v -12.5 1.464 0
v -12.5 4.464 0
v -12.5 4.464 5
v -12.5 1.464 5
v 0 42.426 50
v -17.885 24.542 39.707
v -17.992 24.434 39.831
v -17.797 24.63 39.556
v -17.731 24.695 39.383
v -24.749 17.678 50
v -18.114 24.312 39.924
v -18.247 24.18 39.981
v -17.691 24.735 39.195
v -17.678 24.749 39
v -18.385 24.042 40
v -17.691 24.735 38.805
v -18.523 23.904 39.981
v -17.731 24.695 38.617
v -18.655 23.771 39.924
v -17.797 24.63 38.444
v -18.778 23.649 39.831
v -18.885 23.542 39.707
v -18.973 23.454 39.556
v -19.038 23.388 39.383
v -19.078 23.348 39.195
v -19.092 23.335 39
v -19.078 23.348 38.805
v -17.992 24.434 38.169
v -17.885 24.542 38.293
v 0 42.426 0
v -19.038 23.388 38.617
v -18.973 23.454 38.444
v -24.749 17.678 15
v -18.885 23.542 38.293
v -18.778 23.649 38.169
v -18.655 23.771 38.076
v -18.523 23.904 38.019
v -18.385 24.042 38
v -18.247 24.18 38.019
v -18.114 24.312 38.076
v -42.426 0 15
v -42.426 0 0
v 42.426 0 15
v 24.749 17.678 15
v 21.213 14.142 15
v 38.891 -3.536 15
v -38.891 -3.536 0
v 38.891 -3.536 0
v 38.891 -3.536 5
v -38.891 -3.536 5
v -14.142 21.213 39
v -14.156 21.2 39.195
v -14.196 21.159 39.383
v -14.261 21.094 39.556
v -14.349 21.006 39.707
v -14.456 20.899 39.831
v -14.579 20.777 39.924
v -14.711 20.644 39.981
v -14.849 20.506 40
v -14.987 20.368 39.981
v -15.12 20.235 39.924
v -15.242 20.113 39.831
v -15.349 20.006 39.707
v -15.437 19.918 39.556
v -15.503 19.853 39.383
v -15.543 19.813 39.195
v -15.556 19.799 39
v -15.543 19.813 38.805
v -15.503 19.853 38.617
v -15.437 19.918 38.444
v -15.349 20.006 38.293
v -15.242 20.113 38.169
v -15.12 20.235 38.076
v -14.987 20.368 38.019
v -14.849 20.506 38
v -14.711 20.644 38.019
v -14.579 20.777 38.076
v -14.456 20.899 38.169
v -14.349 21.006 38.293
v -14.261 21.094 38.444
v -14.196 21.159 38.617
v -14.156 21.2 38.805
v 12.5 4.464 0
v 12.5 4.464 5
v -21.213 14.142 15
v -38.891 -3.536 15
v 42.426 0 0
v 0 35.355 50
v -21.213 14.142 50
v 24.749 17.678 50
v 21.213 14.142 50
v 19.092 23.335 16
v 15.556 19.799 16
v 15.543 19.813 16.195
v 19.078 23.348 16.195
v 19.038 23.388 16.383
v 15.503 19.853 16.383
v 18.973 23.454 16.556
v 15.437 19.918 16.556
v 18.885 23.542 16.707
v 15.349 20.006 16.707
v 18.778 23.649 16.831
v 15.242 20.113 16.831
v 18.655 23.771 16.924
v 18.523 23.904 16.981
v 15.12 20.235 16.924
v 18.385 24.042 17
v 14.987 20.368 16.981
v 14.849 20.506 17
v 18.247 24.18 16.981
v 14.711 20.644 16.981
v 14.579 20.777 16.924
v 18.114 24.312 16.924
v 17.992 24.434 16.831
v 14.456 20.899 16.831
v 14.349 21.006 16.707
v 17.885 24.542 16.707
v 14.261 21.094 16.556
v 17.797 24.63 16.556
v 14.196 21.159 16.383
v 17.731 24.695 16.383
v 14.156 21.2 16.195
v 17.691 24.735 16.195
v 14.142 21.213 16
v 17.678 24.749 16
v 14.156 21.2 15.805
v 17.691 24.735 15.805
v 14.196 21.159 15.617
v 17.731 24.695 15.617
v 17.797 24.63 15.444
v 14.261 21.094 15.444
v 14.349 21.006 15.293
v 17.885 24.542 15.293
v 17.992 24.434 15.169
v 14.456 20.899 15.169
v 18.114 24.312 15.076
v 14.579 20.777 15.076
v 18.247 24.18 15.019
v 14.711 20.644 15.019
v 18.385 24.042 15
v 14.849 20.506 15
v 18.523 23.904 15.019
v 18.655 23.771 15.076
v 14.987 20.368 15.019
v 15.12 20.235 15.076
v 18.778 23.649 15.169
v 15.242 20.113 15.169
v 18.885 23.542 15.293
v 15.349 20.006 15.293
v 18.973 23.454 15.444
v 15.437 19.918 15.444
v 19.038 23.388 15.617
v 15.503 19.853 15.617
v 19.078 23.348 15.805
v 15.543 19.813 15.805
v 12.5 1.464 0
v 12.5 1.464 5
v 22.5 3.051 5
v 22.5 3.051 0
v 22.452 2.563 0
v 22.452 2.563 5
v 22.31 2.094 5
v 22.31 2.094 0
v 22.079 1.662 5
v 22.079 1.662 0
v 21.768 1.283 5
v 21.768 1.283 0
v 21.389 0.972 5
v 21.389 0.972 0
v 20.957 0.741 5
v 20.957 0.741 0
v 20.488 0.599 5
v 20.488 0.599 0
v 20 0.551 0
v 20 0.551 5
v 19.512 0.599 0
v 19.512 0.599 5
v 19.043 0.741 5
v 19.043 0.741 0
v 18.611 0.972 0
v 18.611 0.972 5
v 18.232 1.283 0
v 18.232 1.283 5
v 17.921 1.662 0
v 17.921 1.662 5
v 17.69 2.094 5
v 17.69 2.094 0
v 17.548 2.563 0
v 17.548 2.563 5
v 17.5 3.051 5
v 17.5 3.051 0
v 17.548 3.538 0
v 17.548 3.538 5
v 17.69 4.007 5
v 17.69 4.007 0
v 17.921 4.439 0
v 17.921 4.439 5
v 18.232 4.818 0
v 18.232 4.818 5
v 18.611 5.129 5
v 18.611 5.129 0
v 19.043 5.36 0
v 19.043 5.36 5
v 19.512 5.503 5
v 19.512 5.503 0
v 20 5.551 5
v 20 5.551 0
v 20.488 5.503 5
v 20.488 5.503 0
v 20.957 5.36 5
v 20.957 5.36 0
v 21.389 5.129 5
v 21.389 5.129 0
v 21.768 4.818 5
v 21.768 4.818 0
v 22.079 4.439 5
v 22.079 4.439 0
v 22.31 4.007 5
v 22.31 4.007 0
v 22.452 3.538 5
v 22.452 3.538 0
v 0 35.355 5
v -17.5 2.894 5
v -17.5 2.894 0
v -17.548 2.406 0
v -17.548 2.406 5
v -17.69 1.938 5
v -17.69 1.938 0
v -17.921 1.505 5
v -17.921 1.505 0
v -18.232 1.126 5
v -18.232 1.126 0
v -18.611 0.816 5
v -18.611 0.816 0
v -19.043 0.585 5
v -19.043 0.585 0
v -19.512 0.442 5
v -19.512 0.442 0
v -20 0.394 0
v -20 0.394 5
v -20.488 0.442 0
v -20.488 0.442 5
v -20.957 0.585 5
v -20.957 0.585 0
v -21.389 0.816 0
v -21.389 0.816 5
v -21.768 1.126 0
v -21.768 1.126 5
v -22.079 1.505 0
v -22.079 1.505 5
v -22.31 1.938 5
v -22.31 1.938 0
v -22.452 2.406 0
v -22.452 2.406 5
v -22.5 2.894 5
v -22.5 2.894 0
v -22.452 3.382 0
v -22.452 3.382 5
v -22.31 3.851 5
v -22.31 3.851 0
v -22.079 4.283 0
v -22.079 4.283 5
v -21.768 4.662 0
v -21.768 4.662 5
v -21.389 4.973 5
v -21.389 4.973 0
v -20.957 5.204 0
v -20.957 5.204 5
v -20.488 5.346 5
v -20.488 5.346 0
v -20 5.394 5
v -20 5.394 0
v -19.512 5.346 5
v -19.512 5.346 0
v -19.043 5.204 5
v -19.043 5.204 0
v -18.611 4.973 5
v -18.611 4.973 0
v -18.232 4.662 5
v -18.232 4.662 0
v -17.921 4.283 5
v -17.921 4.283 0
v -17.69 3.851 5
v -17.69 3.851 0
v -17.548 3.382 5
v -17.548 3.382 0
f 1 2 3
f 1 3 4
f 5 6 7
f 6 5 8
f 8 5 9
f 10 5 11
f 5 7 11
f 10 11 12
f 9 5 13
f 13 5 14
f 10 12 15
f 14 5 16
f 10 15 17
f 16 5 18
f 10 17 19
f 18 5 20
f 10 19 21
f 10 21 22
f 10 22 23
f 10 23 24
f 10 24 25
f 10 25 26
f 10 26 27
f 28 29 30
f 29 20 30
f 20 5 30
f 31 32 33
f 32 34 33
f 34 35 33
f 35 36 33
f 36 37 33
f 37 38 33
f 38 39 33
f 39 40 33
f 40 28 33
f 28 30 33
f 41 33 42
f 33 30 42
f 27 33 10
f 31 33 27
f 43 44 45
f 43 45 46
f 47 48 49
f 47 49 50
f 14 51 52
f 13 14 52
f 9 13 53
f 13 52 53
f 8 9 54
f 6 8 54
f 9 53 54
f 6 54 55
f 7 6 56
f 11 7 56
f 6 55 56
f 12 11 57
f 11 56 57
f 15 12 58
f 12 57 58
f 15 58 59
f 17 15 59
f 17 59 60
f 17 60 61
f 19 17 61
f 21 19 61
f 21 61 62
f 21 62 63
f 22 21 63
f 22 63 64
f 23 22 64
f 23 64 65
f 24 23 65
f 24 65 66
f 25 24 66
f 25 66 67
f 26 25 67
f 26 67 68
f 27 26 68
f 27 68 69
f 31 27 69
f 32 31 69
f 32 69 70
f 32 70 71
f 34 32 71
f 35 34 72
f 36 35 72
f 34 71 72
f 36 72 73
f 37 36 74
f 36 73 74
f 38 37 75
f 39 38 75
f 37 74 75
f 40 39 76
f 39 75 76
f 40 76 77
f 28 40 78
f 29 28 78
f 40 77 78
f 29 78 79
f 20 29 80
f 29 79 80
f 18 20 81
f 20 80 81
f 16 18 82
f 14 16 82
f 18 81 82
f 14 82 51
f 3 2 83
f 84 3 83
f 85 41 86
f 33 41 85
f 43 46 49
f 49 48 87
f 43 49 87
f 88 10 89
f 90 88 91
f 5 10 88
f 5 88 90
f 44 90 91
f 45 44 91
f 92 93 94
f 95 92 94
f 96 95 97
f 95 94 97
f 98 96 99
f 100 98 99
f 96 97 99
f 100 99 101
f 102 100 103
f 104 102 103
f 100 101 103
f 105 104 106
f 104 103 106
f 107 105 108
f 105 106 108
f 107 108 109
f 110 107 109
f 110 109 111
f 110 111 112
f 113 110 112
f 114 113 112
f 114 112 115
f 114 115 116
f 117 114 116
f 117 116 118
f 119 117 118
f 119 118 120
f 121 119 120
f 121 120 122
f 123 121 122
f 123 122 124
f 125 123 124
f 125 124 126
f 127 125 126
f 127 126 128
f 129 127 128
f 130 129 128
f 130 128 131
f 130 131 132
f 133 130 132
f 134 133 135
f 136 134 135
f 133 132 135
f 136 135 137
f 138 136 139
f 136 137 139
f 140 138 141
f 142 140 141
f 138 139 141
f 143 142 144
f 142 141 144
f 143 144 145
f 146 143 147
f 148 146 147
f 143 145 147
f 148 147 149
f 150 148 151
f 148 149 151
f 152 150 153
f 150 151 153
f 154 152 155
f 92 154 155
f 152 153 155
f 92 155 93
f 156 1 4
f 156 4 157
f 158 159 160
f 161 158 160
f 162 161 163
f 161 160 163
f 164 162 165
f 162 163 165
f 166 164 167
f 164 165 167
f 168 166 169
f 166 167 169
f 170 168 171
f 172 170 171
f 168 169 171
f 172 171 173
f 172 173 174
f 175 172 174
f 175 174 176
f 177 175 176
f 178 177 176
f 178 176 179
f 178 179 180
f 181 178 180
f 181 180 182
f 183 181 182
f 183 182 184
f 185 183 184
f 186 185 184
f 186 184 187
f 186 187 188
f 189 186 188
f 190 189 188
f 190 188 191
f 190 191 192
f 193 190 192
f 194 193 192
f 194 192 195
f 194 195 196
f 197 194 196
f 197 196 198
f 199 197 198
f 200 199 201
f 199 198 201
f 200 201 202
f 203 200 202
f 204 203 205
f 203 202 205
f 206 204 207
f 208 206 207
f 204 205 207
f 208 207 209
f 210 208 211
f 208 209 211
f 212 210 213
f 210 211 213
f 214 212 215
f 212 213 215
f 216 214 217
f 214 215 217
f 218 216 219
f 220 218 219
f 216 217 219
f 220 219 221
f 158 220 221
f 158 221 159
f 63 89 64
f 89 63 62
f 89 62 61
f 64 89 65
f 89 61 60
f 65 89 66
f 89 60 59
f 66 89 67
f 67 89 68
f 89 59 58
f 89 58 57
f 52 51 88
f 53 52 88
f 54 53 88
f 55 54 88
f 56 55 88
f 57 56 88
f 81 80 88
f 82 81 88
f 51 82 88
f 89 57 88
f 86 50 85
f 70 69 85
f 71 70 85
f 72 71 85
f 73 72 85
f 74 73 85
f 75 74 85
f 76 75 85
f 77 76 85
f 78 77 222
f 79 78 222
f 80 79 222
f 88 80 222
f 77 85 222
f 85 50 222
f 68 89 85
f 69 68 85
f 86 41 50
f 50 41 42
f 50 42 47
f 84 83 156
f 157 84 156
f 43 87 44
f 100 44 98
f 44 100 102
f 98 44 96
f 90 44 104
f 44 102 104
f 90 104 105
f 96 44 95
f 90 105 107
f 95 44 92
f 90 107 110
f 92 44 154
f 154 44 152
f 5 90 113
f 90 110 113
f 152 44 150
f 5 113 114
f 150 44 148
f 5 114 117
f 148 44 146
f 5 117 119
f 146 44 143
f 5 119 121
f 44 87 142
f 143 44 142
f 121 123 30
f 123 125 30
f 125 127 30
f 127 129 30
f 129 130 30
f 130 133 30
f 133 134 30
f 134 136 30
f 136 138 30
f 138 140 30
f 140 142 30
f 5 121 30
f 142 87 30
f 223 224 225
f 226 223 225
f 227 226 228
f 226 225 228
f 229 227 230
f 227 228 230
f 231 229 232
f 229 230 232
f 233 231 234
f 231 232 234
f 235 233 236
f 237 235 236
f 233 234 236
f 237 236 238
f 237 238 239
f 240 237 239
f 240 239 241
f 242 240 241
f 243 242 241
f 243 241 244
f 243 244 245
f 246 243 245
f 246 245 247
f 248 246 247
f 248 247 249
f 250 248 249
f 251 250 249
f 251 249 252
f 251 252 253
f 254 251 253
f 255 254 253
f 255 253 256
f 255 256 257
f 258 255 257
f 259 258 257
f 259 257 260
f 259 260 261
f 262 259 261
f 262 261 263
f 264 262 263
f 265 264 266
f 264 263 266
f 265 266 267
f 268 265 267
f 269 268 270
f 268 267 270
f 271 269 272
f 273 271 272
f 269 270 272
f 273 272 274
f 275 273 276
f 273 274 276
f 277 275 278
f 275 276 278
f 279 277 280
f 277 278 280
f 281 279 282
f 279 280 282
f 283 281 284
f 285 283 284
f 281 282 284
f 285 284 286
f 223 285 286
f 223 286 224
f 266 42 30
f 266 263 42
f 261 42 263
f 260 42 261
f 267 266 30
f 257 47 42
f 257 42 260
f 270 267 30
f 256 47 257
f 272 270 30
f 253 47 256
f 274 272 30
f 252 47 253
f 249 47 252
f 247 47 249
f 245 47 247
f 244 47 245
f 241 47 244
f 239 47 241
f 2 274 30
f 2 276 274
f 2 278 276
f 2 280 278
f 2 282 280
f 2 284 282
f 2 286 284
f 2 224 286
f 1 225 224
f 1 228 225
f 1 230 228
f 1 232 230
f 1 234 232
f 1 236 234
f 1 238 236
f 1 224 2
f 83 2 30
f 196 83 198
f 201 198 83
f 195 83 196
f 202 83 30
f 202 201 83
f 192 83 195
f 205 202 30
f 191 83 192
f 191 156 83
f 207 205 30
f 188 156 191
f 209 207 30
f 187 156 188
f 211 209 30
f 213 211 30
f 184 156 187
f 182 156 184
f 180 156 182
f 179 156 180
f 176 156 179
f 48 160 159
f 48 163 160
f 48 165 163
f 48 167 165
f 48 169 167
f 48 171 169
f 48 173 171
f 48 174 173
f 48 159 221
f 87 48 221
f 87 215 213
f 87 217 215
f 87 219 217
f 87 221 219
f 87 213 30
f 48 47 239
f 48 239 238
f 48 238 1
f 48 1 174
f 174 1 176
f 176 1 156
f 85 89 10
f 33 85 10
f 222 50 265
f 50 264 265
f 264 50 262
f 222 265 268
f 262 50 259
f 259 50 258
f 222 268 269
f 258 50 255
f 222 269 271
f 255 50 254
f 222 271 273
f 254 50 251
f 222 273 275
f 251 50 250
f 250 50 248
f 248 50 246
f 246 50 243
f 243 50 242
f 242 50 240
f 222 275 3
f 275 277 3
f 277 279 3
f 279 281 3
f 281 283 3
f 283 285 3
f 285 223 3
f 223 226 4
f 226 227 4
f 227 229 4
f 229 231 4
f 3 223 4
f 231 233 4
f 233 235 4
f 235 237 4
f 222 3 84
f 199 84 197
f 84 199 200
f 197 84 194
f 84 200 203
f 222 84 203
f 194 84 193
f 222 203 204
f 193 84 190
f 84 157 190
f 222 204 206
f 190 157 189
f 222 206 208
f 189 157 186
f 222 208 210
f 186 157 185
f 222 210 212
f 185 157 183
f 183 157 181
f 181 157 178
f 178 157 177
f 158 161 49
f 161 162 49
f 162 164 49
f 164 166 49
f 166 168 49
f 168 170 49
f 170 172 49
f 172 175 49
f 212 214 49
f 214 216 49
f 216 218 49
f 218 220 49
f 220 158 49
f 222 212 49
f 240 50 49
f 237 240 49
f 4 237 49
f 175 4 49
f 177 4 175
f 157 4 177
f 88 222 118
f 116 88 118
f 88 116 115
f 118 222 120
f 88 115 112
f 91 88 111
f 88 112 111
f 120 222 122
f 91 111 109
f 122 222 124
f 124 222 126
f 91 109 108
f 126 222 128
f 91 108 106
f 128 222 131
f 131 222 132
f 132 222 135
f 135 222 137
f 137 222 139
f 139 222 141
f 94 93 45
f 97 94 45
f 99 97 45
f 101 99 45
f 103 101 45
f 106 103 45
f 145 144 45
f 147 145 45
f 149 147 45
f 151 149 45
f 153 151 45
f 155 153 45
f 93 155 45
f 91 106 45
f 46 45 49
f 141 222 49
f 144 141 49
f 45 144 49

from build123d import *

# Parameters (mm, degrees)
F1_DEPTH  = 50
F3_DEPTH  = 5
F4_W      = 25
F4_H      = 3
F4_R      = 2.5
F5_DEPTH  = 25
F6_R      = 1
F8_DEPTH  = 25
F7_R      = 1
F9_DEPTH  = 25
F13_DEPTH = 35


# Not quite as in the source:
# - a feature names something its author has since deleted; it is built from what else it names


with BuildPart() as f1:
    # F0 (on Top) → F1 (new body)
    with BuildSketch(Plane.XY):
        Polygon((0, 42.4264068712), (-42.4264068712, 0), (-38.8908729653, -3.5355339059), (0, 35.3553390593), (38.8908729653, -3.5355339059), (42.4264068712, 0), align=None)
    extrude(amount=F1_DEPTH)

    # F2 (on face) → F3 (join)
    with BuildSketch(Plane(origin=(0, 0, 0), x_dir=(1, 0, 0), z_dir=(0, 0, -1))):
        Polygon((38.8908729653, 3.5355339059), (-38.8908729653, 3.5355339059), (0, -35.3553390593), align=None)
    extrude(amount=-F3_DEPTH)

    # F4 (on face) → F5 (cut)
    with BuildSketch(Plane(origin=(0, 0, 0), x_dir=(1, 0, 0), z_dir=(0, 0, -1))):
        with Locations((0, -2.9644660941)):
            Rectangle(F4_W, F4_H)
        with Locations((20, -3.0505650211)):
            Circle(F4_R)
        with Locations((-20, -2.8942257773)):
            Circle(F4_R)
    extrude(amount=-F5_DEPTH, mode=Mode.SUBTRACT)

    # F6 (on face) → F8 (cut)
    with BuildSketch(Plane(origin=(-17.6776695297, 17.6776695297, 0), x_dir=(0.7071067812, 0.7071067812, 0), z_dir=(0.7071067812, -0.7071067812, 0))):
        with Locations((4, 39)):
            Circle(F6_R)
    extrude(amount=-F8_DEPTH, mode=Mode.SUBTRACT)

    # F7 (on face) → F9 (cut)
    with BuildSketch(Plane(origin=(17.6776695297, 17.6776695297, 0), x_dir=(0.7071067812, -0.7071067812, 0), z_dir=(-0.7071067812, -0.7071067812, 0))):
        with Locations((-4, 16)):
            Circle(F7_R)
    extrude(amount=-F9_DEPTH, mode=Mode.SUBTRACT)

    # F12 (on face) → F13 (cut)
    with BuildSketch(Plane.XY.offset(50)):
        Polygon((-38.8908729653, -3.5355339059), (-21.2132034356, 14.1421356237), (-24.7487373415, 17.6776695297), (-42.4264068712, 0), align=None)
        Polygon((24.7487373415, 17.6776695297), (21.2132034356, 14.1421356237), (38.8908729653, -3.5355339059), (42.4264068712, 0), align=None)
    extrude(amount=-F13_DEPTH, mode=Mode.SUBTRACT)


solid = f1.part
